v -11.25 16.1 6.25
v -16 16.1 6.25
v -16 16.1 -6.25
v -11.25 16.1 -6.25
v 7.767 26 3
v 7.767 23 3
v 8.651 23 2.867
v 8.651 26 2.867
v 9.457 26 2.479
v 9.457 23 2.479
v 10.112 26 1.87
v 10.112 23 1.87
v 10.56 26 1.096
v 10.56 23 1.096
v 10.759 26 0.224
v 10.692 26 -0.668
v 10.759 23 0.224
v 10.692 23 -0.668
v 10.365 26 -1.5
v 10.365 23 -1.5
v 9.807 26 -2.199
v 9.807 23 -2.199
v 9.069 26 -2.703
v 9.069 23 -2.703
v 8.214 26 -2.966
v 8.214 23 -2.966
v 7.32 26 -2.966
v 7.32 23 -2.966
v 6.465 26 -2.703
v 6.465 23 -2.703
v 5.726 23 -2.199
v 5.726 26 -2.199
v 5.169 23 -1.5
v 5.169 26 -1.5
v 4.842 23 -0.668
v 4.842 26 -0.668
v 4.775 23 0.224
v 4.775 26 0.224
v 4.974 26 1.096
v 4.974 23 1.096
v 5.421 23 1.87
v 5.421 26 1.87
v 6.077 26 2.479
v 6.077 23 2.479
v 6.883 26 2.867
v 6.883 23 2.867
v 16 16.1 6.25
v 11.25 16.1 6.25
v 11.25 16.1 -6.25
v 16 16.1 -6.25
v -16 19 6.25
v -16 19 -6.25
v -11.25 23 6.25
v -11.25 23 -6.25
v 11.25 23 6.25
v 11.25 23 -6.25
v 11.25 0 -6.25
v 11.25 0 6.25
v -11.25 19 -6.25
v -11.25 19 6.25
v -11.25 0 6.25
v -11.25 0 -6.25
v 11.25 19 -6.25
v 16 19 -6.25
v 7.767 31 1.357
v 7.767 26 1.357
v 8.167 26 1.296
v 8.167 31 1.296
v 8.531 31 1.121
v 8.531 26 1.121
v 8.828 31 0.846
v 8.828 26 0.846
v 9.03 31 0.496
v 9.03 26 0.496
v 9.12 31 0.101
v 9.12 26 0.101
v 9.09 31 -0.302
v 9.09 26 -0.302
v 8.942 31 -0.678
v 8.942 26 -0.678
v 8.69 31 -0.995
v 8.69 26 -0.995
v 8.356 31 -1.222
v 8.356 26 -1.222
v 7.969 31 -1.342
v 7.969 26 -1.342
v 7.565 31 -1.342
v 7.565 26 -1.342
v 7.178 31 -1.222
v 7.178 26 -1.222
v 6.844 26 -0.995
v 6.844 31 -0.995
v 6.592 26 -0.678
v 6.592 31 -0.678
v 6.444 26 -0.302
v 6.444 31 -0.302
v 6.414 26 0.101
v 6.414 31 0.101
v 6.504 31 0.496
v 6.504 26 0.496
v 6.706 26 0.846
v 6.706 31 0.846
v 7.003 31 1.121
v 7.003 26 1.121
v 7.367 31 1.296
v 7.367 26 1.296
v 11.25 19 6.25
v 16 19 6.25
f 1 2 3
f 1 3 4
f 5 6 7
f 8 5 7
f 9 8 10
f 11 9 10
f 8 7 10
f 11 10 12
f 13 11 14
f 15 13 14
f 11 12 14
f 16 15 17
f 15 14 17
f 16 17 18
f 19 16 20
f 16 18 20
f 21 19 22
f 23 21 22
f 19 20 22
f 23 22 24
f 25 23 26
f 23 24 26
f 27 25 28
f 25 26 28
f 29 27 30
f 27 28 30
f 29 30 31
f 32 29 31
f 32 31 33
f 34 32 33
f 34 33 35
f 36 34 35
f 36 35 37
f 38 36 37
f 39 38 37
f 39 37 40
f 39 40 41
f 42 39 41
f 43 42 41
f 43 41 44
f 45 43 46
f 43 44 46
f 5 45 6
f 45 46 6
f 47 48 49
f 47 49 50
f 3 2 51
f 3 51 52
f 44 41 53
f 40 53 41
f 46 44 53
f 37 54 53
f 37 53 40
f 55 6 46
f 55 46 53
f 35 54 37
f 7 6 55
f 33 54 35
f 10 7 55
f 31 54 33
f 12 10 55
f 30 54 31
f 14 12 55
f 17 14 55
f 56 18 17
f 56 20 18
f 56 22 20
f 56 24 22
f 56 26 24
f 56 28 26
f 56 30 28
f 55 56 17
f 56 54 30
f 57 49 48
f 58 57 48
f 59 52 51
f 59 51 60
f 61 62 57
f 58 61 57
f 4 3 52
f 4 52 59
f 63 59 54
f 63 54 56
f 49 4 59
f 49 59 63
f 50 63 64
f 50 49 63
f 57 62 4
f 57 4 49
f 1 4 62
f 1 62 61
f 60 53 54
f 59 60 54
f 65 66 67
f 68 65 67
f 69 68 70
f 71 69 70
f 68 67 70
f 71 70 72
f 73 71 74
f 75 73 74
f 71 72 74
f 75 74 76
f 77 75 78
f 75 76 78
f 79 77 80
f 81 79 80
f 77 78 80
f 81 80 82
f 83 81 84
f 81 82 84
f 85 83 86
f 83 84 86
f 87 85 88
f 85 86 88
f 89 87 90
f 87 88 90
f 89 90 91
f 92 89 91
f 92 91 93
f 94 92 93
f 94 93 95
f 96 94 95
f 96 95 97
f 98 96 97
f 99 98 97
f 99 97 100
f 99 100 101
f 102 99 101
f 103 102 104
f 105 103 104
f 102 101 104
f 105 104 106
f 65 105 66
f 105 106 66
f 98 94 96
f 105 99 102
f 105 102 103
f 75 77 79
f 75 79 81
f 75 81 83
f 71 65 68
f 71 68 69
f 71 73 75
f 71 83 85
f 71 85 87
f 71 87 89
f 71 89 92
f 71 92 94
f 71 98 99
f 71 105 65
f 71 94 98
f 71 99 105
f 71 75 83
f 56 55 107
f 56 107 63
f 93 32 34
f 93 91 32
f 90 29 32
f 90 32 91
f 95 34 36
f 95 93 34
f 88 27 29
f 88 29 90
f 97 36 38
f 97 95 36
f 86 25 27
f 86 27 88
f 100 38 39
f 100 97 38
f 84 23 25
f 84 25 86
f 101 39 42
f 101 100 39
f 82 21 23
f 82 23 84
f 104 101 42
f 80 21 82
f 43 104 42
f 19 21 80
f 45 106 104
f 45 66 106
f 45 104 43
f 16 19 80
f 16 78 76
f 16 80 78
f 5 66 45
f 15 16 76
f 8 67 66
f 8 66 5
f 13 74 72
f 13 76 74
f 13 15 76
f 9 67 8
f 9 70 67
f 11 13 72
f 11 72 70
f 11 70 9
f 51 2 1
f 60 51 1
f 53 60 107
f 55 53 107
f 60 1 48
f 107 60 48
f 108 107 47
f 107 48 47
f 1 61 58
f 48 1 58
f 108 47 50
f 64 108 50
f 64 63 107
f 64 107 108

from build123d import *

# Parameters (mm, degrees)
SKETCH_1_W          = 32
SKETCH_1_H          = 12.5
EXTRUDE_1_DEPTH     = 23
SKETCH_3_W          = 4.75
SKETCH_3_H          = 12.5
CUT_EXTRUDE_2_DEPTH = 4
SKETCH_8_W          = 4.75
SKETCH_8_H          = 12.5
CUT_EXTRUDE_3_DEPTH = 16.1
SKETCH_9_R          = 3
EXTRUDE_2_DEPTH     = 3
SKETCH_10_R         = 1.356770986
EXTRUDE_3_DEPTH     = 5


with BuildPart() as part:
    # 草图1 → 凸台-拉伸1 (new body)
    with BuildSketch(Plane(origin=(0, 0, 0), x_dir=(1, 0, 0), z_dir=(0, 1, 0))):
        Rectangle(SKETCH_1_W, SKETCH_1_H)
    extrude(amount=EXTRUDE_1_DEPTH)

    # 草图3 → 切除-拉伸2 (cut)
    with BuildSketch(Plane(origin=(0, 23, 0), x_dir=(1, 0, 0), z_dir=(0, 1, 0))):
        with Locations((-13.625, 0)):
            Rectangle(SKETCH_3_W, SKETCH_3_H)
        with Locations((13.625, 0)):
            Rectangle(SKETCH_3_W, SKETCH_3_H)
    extrude(amount=-CUT_EXTRUDE_2_DEPTH, mode=Mode.SUBTRACT)

    # 草图8 → 切除-拉伸3 (cut)
    with BuildSketch(Plane.XZ):
        with Locations((13.625, 0)):
            Rectangle(SKETCH_8_W, SKETCH_8_H)
        with Locations((-13.625, 0)):
            Rectangle(SKETCH_8_W, SKETCH_8_H)
    extrude(amount=-CUT_EXTRUDE_3_DEPTH, mode=Mode.SUBTRACT)

    # 草图9 → 凸台-拉伸2 (add)
    with BuildSketch(Plane(origin=(0, 23, 0), x_dir=(1, 0, 0), z_dir=(0, 1, 0))):
        with Locations(Location((7.766955593, 0, 0), (0, 0, 270))):
            Circle(SKETCH_9_R)
    extrude(amount=EXTRUDE_2_DEPTH)

    # 草图10 → 凸台-拉伸3 (add)
    with BuildSketch(Plane(origin=(0, 26, 0), x_dir=(1, 0, 0), z_dir=(0, 1, 0))):
        with Locations(Location((7.766955593, 0, 0), (0, 0, 270))):
            Circle(SKETCH_10_R)
    extrude(amount=EXTRUDE_3_DEPTH)


solid = part.part
